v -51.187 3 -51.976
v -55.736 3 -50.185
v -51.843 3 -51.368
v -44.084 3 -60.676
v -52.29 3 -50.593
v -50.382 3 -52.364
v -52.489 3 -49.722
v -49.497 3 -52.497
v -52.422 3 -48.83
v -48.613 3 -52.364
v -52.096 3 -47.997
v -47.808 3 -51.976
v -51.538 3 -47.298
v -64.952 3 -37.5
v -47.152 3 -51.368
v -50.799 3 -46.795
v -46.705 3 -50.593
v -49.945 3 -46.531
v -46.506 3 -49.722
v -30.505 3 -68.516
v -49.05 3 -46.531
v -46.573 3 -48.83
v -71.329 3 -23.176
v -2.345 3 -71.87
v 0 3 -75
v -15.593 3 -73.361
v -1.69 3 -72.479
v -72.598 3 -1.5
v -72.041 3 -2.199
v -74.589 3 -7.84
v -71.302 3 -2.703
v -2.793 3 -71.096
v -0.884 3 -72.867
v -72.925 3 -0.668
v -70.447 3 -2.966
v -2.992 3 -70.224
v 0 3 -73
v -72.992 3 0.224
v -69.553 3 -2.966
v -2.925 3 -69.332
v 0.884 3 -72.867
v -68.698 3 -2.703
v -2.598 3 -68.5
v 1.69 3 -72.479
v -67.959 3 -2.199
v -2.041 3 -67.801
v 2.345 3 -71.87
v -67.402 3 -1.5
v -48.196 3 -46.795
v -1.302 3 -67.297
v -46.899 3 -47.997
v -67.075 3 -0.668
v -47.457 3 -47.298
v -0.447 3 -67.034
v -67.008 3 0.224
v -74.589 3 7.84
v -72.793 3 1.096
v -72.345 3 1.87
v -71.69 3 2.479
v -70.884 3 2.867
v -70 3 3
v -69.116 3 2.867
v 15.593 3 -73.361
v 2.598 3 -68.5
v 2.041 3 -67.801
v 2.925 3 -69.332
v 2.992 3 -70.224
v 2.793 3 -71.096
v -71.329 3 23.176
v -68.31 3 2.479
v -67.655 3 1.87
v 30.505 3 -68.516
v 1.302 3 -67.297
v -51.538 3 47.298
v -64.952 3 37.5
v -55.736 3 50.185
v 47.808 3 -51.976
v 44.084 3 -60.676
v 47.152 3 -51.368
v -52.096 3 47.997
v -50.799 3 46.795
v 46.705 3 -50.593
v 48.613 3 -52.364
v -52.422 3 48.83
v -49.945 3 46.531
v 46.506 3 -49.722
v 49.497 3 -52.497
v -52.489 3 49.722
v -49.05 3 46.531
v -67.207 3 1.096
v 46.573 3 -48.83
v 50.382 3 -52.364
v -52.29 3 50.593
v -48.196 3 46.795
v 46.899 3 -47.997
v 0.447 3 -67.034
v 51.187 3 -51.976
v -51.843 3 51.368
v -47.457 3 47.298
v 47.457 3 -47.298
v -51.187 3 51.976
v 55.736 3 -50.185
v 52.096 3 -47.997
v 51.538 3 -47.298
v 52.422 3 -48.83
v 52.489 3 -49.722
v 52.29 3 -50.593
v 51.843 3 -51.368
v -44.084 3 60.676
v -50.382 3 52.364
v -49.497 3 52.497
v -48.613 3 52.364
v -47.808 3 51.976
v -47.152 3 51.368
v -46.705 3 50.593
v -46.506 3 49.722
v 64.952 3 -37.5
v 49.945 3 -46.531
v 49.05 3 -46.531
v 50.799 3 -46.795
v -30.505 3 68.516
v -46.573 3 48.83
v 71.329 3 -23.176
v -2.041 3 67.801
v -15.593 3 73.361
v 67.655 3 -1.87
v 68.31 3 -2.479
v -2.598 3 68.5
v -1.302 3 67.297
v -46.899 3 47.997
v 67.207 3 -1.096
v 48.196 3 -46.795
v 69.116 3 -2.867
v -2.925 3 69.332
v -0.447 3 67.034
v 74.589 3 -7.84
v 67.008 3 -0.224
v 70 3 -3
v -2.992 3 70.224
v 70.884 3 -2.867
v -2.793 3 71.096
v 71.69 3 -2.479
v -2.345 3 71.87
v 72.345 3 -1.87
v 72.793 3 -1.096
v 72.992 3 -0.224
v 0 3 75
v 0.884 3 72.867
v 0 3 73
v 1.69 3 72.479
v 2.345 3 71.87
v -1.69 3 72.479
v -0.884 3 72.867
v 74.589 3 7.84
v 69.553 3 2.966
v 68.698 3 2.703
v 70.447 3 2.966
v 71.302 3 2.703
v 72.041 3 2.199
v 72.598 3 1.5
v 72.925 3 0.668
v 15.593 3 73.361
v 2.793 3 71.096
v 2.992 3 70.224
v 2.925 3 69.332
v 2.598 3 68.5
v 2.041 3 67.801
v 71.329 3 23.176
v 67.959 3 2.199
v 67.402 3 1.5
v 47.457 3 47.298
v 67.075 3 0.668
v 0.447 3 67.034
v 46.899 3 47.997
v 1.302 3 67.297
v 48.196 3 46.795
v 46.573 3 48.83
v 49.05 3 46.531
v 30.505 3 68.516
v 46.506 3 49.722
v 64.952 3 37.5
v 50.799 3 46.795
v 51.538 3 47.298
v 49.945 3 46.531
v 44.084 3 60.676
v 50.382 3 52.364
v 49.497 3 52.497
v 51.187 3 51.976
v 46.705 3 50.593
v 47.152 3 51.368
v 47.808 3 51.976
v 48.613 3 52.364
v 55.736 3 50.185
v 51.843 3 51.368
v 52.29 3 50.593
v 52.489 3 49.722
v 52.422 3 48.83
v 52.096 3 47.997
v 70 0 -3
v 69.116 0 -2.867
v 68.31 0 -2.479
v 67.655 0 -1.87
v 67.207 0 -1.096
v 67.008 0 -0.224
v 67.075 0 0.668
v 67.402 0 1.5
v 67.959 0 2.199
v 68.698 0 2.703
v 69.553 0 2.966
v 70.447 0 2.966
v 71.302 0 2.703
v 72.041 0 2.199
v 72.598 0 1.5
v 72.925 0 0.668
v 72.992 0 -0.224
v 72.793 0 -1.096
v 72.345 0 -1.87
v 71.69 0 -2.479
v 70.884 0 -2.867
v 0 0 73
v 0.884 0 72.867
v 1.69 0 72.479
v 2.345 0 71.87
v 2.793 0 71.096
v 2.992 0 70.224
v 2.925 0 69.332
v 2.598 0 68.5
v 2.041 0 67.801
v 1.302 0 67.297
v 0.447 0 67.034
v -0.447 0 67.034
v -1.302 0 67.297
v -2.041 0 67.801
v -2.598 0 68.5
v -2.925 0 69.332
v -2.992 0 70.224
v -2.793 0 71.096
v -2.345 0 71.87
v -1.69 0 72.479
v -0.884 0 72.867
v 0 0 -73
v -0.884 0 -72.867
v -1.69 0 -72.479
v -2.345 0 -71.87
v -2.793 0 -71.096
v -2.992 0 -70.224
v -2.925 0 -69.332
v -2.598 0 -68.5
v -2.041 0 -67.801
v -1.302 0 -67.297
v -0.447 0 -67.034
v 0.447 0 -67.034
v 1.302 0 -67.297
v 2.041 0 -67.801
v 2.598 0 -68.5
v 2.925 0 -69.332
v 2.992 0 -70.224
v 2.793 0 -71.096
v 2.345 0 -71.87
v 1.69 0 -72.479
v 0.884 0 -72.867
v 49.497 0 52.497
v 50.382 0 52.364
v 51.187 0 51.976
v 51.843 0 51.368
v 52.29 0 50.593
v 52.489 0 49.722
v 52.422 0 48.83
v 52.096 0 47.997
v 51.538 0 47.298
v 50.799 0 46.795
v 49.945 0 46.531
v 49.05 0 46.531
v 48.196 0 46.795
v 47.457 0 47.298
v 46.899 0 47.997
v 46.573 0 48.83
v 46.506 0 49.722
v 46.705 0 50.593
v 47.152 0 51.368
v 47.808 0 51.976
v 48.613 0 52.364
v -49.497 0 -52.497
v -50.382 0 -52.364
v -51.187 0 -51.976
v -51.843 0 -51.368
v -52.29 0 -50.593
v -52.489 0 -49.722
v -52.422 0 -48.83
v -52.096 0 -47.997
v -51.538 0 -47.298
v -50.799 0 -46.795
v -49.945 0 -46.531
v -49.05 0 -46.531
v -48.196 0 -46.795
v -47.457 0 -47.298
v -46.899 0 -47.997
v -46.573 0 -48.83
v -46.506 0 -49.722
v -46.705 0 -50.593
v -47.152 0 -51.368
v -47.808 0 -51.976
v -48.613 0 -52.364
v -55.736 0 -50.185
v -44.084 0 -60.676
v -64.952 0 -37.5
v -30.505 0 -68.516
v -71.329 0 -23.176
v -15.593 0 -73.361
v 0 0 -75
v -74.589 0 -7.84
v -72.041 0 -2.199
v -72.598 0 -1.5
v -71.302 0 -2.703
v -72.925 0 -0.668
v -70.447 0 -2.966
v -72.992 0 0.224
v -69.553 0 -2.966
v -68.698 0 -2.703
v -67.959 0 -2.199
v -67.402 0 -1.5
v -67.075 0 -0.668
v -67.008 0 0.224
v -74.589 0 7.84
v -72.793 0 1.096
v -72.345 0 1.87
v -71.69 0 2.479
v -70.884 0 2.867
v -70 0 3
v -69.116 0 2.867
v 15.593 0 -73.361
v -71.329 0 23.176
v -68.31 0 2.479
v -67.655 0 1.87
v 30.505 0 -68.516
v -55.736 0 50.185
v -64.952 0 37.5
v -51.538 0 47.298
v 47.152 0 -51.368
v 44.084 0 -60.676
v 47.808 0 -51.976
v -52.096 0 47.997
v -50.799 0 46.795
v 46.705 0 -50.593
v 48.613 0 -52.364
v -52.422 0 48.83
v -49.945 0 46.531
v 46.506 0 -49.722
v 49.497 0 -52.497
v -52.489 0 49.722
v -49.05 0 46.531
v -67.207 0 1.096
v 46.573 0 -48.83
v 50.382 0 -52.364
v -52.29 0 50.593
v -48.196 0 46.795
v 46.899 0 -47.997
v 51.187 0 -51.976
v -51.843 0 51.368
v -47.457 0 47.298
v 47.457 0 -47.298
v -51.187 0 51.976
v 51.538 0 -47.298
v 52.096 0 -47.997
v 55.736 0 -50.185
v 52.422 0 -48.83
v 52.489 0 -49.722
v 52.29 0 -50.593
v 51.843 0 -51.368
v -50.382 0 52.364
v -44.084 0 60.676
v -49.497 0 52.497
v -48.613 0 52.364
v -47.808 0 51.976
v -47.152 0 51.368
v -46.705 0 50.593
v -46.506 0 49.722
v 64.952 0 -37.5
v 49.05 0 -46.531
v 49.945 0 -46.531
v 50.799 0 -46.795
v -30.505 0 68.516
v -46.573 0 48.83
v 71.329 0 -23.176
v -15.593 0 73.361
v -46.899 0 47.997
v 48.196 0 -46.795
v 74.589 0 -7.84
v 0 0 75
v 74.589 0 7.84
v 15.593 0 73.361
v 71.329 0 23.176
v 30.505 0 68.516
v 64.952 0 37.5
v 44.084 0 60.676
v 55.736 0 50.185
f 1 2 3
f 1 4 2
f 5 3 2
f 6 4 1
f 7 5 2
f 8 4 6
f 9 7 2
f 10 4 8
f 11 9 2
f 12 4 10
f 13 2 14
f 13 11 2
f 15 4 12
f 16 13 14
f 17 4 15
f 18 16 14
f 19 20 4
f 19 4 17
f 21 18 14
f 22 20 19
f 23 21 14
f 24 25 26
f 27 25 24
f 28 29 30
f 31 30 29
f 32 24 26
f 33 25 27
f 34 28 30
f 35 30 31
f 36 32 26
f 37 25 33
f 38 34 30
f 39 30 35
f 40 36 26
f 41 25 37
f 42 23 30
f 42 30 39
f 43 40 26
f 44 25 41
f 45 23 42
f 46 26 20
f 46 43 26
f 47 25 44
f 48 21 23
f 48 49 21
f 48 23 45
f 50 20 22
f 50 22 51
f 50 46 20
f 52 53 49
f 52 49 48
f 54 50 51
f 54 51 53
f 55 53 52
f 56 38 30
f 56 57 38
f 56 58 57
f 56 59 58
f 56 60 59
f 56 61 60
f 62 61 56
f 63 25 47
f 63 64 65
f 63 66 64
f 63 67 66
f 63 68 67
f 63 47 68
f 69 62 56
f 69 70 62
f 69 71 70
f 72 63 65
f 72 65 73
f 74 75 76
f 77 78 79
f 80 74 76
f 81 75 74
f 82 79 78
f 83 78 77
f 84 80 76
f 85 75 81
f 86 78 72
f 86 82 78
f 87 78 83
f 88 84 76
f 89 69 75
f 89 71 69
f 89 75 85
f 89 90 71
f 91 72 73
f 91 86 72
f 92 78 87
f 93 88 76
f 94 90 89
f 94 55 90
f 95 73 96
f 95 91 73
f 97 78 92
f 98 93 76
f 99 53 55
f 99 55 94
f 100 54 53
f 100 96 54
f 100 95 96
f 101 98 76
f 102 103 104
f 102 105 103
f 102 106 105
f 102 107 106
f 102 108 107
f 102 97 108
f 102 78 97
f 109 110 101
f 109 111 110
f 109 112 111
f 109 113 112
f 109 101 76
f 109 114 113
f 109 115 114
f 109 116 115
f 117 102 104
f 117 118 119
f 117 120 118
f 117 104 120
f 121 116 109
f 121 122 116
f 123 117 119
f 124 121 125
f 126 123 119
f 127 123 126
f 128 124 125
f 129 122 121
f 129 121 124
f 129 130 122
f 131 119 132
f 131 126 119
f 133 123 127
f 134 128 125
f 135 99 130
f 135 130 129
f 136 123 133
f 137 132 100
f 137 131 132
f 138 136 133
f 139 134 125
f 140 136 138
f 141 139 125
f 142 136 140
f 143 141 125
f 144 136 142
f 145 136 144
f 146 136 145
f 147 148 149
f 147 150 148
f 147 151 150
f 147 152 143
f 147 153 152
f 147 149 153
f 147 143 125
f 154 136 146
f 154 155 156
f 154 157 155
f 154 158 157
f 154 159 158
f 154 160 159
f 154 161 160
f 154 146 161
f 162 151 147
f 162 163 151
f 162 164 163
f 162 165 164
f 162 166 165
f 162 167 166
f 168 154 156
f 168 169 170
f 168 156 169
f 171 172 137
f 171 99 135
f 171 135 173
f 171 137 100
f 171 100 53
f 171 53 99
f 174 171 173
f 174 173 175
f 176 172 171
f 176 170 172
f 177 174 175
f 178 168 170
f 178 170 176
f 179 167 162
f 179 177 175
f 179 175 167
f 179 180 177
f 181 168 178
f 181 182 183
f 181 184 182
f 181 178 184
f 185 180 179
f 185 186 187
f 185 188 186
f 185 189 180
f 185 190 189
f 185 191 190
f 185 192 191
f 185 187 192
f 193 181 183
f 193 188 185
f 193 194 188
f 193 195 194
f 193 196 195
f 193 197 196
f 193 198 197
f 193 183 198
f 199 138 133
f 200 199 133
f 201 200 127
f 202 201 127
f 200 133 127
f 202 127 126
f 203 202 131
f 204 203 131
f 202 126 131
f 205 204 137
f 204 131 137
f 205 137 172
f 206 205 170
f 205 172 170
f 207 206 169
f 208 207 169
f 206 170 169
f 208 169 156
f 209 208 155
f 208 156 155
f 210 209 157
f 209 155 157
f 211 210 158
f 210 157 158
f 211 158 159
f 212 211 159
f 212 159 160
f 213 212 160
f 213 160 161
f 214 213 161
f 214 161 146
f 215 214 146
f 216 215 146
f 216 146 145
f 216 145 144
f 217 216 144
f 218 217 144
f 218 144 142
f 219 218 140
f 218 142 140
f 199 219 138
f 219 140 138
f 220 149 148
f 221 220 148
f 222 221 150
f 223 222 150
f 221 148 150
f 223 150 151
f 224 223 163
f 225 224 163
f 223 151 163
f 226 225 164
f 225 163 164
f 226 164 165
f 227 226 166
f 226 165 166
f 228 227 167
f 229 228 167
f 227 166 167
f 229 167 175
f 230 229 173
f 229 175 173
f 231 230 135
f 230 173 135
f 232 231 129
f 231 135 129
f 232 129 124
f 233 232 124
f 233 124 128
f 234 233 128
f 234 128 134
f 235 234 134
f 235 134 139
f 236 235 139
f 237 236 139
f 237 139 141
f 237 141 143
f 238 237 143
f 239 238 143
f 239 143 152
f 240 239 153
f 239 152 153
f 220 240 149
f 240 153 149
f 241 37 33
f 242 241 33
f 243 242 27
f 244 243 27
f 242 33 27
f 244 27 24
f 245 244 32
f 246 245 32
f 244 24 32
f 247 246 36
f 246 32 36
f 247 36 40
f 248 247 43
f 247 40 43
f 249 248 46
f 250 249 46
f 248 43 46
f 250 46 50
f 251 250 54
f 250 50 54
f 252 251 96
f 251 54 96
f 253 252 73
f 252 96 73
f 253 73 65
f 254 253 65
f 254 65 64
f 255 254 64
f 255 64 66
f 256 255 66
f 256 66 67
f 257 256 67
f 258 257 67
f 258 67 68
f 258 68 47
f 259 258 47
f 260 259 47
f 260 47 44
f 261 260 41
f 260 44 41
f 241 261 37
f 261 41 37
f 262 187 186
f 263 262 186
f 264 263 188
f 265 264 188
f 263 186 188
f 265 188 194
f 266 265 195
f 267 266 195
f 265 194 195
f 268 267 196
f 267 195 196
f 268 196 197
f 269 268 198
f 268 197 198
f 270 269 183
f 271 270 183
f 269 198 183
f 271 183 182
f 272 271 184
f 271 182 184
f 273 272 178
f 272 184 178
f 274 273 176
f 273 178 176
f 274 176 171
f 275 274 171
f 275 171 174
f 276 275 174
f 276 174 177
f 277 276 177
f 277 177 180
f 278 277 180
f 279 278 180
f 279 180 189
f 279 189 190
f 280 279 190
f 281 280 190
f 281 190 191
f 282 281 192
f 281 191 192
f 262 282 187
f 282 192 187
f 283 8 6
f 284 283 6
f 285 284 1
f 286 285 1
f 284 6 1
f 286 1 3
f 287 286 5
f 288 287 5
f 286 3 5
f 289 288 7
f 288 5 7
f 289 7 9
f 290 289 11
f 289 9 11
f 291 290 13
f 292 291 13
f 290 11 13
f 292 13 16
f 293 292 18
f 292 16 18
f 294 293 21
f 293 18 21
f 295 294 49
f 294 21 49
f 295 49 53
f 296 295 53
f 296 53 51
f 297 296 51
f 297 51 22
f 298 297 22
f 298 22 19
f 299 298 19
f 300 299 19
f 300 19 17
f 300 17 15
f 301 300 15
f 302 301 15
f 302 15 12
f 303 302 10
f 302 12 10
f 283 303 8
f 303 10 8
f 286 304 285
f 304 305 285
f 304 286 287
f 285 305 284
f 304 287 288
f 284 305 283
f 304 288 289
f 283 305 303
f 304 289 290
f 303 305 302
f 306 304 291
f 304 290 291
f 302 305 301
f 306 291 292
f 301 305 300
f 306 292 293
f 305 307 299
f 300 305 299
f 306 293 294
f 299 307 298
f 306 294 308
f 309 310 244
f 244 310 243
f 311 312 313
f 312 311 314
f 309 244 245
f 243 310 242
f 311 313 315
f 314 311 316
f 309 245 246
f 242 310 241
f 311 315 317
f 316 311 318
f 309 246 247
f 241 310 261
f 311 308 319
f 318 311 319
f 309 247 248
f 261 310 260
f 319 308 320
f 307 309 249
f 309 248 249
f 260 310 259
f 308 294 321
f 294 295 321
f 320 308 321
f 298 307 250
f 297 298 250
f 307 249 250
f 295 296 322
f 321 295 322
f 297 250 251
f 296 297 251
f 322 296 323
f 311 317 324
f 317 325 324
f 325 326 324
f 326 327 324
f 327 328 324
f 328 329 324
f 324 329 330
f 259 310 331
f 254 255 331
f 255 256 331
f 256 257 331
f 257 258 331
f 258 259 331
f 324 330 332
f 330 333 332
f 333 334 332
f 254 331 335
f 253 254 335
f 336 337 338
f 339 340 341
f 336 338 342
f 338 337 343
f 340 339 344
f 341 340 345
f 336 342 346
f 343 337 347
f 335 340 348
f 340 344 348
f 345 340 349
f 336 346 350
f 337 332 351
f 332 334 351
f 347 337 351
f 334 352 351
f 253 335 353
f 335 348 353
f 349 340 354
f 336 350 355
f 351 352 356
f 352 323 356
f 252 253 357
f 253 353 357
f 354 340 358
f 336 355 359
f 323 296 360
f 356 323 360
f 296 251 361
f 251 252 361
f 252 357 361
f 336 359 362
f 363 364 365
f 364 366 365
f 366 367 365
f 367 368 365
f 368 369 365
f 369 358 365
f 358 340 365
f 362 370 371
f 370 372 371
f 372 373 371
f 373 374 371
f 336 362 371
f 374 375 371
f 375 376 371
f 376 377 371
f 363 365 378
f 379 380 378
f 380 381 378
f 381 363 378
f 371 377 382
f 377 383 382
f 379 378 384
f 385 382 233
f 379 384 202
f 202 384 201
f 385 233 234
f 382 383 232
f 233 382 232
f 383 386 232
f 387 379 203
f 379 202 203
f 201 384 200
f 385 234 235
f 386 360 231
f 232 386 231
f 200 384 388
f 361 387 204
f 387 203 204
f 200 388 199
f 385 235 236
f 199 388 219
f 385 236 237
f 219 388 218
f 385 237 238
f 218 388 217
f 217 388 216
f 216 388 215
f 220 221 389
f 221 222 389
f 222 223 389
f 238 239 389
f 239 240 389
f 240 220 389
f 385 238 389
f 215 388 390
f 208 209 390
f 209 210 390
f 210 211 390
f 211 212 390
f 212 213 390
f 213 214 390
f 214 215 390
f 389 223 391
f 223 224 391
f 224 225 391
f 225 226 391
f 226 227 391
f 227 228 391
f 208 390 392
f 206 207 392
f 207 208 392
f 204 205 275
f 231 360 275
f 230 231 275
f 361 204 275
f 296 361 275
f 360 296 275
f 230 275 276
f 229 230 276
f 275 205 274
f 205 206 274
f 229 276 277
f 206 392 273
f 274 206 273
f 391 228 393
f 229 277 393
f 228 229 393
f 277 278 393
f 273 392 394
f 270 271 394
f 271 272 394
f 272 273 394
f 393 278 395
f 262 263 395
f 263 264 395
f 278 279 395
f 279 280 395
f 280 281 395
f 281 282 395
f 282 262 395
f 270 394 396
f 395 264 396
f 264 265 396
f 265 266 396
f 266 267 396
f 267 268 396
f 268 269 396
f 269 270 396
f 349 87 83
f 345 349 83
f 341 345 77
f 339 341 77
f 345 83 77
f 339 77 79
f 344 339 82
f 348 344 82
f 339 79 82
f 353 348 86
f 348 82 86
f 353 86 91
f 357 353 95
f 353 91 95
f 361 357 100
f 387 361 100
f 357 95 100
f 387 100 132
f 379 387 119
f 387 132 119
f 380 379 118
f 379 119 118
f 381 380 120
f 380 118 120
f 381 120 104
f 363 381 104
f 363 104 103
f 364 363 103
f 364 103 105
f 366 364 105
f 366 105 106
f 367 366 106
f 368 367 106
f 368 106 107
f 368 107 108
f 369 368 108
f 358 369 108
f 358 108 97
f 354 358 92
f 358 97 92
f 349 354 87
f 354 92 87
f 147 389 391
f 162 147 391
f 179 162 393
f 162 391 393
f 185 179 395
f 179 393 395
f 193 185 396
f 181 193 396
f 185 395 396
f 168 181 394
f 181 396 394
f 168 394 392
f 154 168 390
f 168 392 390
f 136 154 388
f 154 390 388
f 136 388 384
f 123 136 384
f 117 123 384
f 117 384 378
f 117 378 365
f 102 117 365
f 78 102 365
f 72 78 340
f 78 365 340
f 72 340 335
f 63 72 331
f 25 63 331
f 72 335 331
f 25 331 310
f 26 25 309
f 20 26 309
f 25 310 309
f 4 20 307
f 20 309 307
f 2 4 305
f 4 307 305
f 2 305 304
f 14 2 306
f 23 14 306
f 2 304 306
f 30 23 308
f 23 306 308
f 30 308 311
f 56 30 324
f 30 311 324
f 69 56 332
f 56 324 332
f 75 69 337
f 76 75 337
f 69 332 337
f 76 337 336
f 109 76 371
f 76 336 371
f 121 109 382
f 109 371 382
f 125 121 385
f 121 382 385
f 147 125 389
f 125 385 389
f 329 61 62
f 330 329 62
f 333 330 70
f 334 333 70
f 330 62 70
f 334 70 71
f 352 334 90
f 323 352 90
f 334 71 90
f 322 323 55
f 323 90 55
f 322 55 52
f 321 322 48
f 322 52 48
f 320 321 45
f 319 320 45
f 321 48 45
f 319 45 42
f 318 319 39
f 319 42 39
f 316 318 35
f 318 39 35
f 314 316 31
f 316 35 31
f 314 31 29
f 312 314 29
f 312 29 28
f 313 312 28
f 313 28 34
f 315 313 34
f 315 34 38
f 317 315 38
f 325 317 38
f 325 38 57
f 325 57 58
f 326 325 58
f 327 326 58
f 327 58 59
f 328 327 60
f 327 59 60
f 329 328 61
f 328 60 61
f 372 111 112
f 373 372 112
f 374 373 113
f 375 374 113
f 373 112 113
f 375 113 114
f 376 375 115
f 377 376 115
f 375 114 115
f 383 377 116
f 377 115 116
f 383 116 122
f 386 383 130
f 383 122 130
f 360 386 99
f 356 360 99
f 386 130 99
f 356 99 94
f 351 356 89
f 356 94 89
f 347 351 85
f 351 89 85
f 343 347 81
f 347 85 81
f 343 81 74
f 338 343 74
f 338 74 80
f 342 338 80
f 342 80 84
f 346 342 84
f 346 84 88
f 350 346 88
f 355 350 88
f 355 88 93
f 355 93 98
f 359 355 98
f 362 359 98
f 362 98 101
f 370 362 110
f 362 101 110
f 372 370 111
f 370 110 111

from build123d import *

# Parameters (mm, degrees)
SKETCH_1_R          = 75
EXTRUDE_1_DEPTH     = 3
SKETCH_2_R          = 3
CUT_EXTRUDE_1_DEPTH = 3


with BuildPart() as part:
    # Эскиз1 → Бобышка-Вытянуть1 (new body)
    with BuildSketch(Plane(origin=(0, 0, 0), x_dir=(1, 0, 0), z_dir=(0, 1, 0))):
        with Locations(Location((0, 0, 0), (0, 0, 270))):
            Circle(SKETCH_1_R)
    extrude(amount=EXTRUDE_1_DEPTH)

    # Эскиз2 → Вырез-Вытянуть1 (cut)
    with BuildSketch(Plane(origin=(0, 3, 0), x_dir=(1, 0, 0), z_dir=(0, 1, 0))):
        with Locations(Location((-70, 0, 0), (0, 0, 270))):
            Circle(SKETCH_2_R)
        with Locations(Location((70, 0, 0), (0, 0, 90))):
            Circle(SKETCH_2_R)
        with Locations(Location((0, -70, 0), (0, 0, 270))):
            Circle(SKETCH_2_R)
        with Locations(Location((0, 70, 0), (0, 0, 90))):
            Circle(SKETCH_2_R)
        with Locations(Location((-49.497474683, -49.497474683, 0), (0, 0, 270))):
            Circle(SKETCH_2_R)
        with Locations(Location((-49.497474683, 49.497474683, 0), (0, 0, 90))):
            Circle(SKETCH_2_R)
        with Locations(Location((49.497474683, -49.497474683, 0), (0, 0, 270))):
            Circle(SKETCH_2_R)
        with Locations(Location((49.497474683, 49.497474683, 0), (0, 0, 90))):
            Circle(SKETCH_2_R)
    extrude(amount=-CUT_EXTRUDE_1_DEPTH, mode=Mode.SUBTRACT)


solid = part.part
